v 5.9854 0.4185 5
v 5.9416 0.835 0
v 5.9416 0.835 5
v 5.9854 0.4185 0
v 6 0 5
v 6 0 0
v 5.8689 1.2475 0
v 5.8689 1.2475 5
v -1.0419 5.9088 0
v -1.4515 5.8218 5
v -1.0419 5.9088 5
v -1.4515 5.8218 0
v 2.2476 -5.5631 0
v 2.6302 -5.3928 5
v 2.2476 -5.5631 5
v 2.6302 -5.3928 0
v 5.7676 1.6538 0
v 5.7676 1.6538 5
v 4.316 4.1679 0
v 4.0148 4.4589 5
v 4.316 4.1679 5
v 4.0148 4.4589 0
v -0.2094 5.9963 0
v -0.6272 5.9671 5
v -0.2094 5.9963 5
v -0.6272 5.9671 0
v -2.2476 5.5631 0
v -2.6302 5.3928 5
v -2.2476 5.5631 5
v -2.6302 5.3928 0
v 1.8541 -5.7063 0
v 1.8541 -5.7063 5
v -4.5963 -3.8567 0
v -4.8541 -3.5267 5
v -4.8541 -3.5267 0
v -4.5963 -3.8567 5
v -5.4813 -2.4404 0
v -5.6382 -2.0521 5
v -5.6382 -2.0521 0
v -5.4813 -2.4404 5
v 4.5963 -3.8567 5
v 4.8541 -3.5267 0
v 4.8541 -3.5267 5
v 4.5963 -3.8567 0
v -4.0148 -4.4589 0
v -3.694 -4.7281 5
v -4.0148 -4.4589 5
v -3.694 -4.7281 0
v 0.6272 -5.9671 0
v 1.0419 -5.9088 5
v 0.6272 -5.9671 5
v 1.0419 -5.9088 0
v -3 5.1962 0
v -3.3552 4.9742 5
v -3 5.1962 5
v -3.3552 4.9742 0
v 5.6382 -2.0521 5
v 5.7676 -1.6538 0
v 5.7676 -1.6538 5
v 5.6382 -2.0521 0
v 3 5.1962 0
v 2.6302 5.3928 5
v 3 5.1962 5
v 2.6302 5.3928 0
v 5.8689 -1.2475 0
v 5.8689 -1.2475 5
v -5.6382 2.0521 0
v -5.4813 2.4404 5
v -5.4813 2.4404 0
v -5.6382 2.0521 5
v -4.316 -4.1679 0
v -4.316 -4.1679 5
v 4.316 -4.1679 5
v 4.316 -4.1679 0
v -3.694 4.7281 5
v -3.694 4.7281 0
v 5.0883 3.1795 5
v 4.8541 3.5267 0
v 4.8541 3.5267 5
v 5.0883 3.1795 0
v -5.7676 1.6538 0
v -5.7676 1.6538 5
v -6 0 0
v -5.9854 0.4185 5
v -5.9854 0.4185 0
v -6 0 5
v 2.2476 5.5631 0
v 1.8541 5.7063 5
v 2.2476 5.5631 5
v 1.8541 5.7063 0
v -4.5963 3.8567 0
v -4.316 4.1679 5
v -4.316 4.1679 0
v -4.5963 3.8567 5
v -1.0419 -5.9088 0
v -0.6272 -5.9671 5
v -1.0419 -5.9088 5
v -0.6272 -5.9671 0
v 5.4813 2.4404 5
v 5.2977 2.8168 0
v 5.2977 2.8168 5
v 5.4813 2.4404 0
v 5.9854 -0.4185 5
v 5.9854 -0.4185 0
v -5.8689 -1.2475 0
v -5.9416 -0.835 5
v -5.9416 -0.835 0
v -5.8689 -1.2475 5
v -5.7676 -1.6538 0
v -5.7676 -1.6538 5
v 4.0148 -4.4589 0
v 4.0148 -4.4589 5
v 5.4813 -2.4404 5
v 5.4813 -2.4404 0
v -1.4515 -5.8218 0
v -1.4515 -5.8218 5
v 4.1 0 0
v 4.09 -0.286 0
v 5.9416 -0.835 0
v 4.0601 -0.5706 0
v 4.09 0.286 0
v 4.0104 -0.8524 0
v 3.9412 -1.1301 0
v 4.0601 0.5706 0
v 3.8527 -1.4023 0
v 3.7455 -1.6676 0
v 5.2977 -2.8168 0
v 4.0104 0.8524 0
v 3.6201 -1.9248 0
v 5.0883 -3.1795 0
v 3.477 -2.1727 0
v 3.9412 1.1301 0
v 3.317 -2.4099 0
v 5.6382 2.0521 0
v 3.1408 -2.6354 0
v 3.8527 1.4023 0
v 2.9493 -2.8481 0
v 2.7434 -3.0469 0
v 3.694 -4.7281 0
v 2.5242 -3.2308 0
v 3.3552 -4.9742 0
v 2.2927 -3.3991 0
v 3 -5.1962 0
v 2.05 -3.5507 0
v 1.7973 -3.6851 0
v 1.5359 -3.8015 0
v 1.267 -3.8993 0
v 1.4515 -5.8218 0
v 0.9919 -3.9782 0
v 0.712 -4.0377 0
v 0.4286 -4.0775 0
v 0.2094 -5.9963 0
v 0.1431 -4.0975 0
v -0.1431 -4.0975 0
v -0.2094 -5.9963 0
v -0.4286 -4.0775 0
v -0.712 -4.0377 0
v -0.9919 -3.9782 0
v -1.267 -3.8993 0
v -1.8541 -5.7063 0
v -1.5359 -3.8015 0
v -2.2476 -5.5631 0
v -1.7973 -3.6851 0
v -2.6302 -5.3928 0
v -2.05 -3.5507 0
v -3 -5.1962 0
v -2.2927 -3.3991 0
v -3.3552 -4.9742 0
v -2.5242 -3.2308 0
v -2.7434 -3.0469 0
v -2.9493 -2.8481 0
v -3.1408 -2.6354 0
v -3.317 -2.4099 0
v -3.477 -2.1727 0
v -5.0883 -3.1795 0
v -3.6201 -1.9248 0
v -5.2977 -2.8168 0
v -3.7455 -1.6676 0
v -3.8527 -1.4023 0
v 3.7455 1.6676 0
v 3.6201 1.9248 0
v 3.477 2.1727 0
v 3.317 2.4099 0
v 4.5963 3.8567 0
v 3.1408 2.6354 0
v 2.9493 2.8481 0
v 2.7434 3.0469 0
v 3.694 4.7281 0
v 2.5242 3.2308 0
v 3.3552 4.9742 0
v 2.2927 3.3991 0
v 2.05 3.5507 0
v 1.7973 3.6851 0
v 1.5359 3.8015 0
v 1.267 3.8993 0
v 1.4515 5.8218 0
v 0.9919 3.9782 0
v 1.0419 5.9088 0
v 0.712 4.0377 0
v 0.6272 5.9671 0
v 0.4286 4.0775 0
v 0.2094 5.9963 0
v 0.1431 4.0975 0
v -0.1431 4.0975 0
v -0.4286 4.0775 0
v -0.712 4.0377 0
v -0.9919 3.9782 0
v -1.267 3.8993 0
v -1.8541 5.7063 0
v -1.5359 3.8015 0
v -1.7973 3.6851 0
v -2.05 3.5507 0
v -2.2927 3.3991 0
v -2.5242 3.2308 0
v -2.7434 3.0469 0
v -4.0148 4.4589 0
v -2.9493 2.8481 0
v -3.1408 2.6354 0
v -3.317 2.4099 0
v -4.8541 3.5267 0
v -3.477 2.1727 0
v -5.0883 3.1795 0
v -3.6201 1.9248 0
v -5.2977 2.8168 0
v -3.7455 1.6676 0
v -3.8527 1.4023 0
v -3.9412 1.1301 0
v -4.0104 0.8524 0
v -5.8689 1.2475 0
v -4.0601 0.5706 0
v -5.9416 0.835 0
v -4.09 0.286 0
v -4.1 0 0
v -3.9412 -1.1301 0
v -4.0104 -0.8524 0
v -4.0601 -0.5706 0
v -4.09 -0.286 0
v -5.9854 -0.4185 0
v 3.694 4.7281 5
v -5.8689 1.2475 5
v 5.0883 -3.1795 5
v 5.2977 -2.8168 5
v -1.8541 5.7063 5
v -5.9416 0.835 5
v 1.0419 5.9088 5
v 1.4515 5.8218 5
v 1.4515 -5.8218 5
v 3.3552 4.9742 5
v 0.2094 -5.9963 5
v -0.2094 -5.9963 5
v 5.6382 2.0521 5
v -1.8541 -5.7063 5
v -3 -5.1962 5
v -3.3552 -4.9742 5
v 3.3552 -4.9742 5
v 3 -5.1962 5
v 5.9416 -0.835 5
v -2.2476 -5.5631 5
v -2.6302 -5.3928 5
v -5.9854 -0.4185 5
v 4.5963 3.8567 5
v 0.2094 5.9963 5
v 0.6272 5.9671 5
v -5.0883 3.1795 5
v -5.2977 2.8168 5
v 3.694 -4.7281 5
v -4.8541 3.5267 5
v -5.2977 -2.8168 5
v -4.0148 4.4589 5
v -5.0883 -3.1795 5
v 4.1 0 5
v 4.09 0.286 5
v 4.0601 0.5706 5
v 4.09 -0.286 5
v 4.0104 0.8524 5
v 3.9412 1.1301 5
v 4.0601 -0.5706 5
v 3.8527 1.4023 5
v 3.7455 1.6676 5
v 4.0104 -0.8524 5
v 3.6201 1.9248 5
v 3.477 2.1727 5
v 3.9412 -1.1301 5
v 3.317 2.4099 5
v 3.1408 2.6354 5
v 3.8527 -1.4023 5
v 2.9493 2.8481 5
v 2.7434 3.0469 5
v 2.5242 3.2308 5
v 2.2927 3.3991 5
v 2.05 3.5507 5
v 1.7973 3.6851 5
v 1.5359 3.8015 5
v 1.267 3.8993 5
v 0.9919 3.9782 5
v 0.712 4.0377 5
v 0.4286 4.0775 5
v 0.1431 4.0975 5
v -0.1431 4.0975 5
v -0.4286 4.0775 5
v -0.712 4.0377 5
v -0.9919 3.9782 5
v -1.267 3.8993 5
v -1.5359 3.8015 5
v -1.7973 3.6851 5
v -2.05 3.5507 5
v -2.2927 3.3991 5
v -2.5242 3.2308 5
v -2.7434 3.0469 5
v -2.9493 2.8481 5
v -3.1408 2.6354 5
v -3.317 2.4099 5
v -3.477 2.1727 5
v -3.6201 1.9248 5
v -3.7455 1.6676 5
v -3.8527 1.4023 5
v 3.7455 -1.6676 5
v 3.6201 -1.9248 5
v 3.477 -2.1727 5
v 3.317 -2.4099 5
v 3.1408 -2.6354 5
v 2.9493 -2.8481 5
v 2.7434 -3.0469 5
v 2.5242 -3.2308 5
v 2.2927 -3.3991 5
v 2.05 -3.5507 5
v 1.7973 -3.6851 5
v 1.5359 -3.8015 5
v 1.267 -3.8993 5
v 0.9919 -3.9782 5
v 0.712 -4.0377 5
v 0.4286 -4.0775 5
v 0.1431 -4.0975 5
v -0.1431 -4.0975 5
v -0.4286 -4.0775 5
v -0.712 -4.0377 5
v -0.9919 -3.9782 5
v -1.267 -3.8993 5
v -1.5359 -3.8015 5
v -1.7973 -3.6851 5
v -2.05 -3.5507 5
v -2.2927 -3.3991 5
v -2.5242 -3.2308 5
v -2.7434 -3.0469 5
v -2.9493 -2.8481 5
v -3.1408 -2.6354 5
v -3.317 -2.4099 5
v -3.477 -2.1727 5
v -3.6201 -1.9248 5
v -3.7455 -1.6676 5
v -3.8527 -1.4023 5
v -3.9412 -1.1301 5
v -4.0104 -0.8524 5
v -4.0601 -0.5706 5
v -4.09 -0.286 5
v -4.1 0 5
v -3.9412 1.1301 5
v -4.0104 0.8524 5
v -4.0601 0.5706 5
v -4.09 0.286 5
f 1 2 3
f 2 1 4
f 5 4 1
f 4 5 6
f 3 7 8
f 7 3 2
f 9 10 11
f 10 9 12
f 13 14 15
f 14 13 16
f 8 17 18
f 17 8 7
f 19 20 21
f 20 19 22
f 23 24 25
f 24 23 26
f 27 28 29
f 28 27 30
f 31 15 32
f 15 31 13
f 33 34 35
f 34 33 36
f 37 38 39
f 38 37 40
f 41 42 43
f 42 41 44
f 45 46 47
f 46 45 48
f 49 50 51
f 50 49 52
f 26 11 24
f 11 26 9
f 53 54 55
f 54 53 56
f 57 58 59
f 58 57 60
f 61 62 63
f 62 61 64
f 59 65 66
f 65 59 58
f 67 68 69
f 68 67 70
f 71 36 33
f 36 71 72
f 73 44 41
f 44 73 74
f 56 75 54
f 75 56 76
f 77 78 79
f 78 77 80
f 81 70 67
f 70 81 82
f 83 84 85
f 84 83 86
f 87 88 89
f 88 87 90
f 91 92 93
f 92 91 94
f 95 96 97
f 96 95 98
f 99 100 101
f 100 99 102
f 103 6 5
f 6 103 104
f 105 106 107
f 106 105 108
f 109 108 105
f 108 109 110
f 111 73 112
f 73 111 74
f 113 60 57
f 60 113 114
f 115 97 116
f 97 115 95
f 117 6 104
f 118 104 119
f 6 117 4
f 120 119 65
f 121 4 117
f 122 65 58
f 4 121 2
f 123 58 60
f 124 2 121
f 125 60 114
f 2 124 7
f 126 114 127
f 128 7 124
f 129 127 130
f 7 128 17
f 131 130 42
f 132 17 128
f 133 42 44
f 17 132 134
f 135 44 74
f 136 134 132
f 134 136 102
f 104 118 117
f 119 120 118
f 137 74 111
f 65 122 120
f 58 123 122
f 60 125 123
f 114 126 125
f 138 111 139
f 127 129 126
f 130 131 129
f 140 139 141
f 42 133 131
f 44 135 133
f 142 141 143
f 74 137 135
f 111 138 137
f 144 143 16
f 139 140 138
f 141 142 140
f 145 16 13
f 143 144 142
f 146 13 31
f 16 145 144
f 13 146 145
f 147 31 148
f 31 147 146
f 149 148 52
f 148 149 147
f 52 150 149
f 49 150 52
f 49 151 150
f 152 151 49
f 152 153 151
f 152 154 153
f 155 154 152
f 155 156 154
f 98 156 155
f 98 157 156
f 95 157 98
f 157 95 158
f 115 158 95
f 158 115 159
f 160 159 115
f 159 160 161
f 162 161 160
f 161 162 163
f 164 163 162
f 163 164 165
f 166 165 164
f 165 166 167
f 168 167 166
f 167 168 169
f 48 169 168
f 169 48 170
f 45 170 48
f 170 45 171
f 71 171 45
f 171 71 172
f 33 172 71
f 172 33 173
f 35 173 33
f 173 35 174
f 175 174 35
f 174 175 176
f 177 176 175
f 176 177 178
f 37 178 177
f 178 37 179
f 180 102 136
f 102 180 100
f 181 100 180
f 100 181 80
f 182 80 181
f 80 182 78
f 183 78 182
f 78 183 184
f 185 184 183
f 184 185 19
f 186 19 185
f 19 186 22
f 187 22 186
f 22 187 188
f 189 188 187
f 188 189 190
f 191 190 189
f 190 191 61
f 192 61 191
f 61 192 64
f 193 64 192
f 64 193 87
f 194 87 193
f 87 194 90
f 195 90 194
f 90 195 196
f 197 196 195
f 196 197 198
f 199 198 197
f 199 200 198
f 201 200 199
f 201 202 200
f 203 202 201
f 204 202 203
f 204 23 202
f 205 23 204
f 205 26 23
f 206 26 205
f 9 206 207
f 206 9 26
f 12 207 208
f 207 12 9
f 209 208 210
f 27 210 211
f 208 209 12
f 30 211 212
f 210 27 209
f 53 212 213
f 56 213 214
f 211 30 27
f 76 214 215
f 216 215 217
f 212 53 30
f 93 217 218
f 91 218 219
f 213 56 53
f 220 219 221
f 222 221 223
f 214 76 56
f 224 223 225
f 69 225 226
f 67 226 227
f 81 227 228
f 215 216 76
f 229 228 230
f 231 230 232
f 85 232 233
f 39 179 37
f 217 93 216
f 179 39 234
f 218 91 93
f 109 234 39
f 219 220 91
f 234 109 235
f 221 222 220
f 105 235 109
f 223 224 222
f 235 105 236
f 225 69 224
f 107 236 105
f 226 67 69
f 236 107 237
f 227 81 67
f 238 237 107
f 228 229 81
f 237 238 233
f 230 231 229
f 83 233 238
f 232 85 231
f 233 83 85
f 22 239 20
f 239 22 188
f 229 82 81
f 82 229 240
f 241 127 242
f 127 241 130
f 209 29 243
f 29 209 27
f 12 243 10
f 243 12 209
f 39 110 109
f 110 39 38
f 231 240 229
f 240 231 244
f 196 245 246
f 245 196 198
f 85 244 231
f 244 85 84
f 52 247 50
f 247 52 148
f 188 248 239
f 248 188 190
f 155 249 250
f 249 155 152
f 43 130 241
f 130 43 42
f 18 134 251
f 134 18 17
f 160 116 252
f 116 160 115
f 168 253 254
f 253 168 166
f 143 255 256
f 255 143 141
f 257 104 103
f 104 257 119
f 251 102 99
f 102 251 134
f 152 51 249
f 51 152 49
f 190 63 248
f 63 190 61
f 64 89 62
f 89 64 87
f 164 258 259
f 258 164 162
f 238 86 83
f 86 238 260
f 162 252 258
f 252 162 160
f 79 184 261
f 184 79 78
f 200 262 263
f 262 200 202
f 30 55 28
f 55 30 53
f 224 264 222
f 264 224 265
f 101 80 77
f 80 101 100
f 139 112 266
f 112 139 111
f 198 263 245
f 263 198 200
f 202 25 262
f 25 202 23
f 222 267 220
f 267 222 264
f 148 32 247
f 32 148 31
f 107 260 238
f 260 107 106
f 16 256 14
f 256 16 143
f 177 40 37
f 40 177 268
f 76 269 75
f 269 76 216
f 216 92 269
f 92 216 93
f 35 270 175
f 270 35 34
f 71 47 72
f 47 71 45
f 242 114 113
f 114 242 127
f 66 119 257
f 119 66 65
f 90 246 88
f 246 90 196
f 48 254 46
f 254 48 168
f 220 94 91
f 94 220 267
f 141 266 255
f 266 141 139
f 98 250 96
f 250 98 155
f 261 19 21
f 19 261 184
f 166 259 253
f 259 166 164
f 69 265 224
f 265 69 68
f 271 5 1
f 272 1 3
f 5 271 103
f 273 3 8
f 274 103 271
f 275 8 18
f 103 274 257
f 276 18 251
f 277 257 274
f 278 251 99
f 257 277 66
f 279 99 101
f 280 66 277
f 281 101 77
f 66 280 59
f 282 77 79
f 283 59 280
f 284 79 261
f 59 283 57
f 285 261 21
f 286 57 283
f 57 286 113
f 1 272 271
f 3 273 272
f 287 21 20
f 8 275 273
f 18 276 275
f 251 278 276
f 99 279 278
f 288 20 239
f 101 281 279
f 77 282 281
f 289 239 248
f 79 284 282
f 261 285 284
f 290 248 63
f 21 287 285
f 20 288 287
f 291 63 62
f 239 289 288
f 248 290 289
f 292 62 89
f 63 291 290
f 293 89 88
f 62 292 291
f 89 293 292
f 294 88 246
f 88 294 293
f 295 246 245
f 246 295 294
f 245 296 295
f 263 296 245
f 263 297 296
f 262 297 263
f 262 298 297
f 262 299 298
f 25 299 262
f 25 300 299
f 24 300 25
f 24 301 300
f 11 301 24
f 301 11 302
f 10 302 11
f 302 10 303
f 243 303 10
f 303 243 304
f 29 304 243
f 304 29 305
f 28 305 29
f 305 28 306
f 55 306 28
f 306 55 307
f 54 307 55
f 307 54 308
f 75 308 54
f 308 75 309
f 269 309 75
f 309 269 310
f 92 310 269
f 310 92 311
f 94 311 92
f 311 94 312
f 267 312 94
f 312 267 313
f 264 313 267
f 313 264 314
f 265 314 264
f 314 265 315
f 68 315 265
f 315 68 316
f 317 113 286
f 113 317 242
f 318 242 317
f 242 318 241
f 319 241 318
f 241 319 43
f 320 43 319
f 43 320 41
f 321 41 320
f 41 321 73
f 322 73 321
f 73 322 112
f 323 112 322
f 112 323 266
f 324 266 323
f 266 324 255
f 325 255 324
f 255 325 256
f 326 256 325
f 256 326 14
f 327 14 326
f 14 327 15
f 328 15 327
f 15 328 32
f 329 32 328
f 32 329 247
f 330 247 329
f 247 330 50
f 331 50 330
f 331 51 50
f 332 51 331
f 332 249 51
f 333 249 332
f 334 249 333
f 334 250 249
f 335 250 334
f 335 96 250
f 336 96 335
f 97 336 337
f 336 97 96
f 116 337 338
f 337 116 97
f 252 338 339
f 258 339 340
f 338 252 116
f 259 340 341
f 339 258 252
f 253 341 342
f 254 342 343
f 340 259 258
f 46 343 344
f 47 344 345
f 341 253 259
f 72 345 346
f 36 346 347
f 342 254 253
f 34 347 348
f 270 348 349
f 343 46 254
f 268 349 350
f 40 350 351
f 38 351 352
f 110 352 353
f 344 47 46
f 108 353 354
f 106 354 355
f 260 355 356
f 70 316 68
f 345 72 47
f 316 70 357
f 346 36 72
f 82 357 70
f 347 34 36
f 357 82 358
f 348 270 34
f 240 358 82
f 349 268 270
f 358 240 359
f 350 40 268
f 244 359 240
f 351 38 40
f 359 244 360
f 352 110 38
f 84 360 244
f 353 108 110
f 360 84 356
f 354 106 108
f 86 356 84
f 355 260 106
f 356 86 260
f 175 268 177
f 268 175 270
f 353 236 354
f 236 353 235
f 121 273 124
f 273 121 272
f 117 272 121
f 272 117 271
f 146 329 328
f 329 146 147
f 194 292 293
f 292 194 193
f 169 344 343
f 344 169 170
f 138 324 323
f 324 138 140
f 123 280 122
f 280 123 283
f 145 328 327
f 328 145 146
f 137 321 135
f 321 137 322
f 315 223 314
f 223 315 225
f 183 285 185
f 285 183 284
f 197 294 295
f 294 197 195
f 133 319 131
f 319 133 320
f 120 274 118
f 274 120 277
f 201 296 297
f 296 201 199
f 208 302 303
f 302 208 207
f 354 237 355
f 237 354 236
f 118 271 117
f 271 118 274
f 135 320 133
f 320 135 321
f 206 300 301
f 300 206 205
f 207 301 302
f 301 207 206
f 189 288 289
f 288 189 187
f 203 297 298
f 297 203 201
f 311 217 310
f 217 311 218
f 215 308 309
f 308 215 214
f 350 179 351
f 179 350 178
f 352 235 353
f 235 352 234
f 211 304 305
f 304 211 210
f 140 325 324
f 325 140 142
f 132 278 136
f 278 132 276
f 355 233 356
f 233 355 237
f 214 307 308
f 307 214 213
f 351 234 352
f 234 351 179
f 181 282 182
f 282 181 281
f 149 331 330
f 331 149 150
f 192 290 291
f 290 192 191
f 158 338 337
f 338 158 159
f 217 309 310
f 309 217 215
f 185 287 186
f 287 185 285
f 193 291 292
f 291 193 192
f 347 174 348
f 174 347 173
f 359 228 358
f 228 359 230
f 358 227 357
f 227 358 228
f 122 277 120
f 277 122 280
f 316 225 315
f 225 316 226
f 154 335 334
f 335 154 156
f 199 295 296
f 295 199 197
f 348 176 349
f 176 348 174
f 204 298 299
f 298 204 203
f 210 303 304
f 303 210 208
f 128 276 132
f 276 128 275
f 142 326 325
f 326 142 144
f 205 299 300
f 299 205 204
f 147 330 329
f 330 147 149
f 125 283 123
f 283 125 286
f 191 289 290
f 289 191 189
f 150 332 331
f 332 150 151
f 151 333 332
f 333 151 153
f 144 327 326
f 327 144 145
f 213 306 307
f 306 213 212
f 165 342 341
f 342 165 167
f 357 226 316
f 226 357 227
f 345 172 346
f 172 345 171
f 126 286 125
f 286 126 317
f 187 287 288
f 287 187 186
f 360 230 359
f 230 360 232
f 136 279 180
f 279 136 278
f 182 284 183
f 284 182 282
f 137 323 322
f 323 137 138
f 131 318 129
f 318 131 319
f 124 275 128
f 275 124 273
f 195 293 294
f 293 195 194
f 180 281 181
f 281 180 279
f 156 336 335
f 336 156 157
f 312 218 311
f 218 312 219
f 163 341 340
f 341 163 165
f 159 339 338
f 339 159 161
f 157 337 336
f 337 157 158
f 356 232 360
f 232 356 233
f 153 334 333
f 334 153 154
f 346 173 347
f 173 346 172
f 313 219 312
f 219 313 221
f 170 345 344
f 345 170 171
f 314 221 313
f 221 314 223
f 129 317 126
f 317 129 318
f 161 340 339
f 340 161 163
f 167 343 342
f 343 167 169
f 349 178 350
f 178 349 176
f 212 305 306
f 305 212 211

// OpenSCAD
// file: ../parameters.scad
maximum_printable_size = 150;

layer_thickness = 0.3;
global_clearance = 0.5;


//Screw diameter and nut for M10 [mm]
M10_screw_diameter = 10.4;
M10_head_height = 10;
M10_head_diameter = 16+0.5;
M10_nut_height = 10.5;
M10_nut_diameter = 25.5;
M10_nut_pocket = 22.3;

//Screw diameter for M8 [mm]
M8_screw_diameter = 8.6;
M8_head_height = 8;
M8_head_diameter = 13.5;
M8_nut_height = 7.5;
M8_square_nut_thin_height = 4.5;
M8_nut_diameter = 14.4 + 0.5;
M8_nut_pocket = 13 + 0.5;
M8_washer_diameter = 16;
M8_washer_thickness = 1.5;


//Screw diameter and nut for M6 [mm]
M6_screw_diameter=6.5;
M6_head_diameter = 10+0.5;
M6_head_height = 6;
M6_nut_height = 4.9;
M6_nut_diameter = 11.8;
M6_nut_pocket = 10.4;
M6_square_nut_height = 3;
M6_square_nut_diameter = 10;
M6_washer_thickness = 1.6;

//Screw diameter and nut for M5 [mm]
M5_screw_diameter=5.5;
M5_head_height = 5;
M5_head_diameter = 13+0.5;
M5_nut_height = 4.5;
M5_nut_diameter = 9.4;
M5_nut_pocket = 8.4;

//Screw diameter and nut for M4 [mm]
M4_screw_diameter=4.5;
M4_screw_head_height = 4;
M4_nut_height = 3.2;
M4_nut_diameter = 8.4;
M4_nut_pocket = 7.5;

//Screw diameter and nut for M3 [mm]
M3_screw_diameter = 3.2;
M3_nut_height = 2.7;
M3_nut_diameter = 6.6;
M3_nut_pocket = 5.6;
M3_screw_head_height = 3;

//Screw diameter and nut for M2,5 [mm]
M2_5_screw_diameter = 2.7;
M2_5_nut_height = 2.3;
M2_5_nut_diameter = 6;
M2_5_nut_pocket = 5.5;

//ALU profile
ALU_profile_width = 30.5;
ALU_profile_holder_wall_thickness = 3;
ALU_profile_groove_width = 8;





// Platform parameters ////////////////////////////////////////////
// Main profile parameters
starting_platform_length = 1000; // Main platform profile length
starting_platform_angle = 10; // Angle of attack for platform

// Main cube profile lengths
profile_length_x = 600;
profile_length_y = 600;
profile_length_z = 260;


// Compressor dimensions
compressor_length_x = 410;
compressor_length_y = 140;
compressor_length_z = 310;

// Platform front support parameters
front_holder_width = 160;
front_holder_angle = 25;
front_holder_height = 60;
front_holder_offset = 15;
front_holder_height_offset = 110;

// Lock moving servo parameters
// static par.
servo_length = 40;
servo_width = 20;
servo_height = 40;
servo_axle_offset = 12.5;
servo_axle_height = 5;
servo_movement_angle = 60;
servo_movement_angle_offset = -35; // angle offset up
servo_force = 1.65; // [N/m] torque of servo

// dynamic par.
servo_arm_length = servo_width/2+ALU_profile_width/2+ALU_profile_holder_wall_thickness+4;
servo_travel_y = cos((servo_movement_angle-abs(servo_movement_angle_offset))/2)*servo_arm_length;
servo_arm_hole_length = (servo_arm_length/cos(servo_movement_angle/2))-servo_arm_length+M3_screw_diameter;
servo_joint_offset = sin(servo_movement_angle+servo_movement_angle_offset)*(servo_arm_length+servo_arm_hole_length)+servo_axle_offset;
servo_joint_offset_by_angle = -tan(servo_movement_angle_offset)*servo_arm_length;
servo_max_linear_force = servo_force/(servo_arm_length/1000); // max servo linear force [N]
servo_min_linear_force = cos(servo_movement_angle+abs(servo_movement_angle_offset))*servo_max_linear_force; // min servo linear force [N] in the most extreme position
servo_holding_linear_force = cos(servo_movement_angle+servo_movement_angle_offset)*servo_max_linear_force; // min servo linear force [N] in holding position

// Lock static parameters
lock_screws_dia = 3.2;
lock_depth = 20;
lock_axle_diameter = 15;
lock_grab_axle_dia = 13;
lock_arms_joint_offset = 30;
lock_arms_joint_angle = 90-.01;
lock_tooth_width = 2;

lock_tube_angle = 0;

// Lock dynamic parameters
lock_push_force = (servo_holding_linear_force/cos(lock_arms_joint_angle))/cos(lock_arms_joint_angle); // lock arm pushing force on linear servo joint
lock_push_arm_length = 45;
lock_arm_force_ratio = 1; // lock arm change holding force ratio (0.5 = arm will have half holding force)
lock_hold_arm_length = lock_push_arm_length/lock_arm_force_ratio;
lock_holding_force = lock_push_force*lock_arm_force_ratio;
lock_joint_arm_length = lock_push_arm_length;
// main file
include <../parameters.scad>

module 888_3007(h=5) {
    difference()
    {
        cylinder(d=12,h=h,$fn=90);
        cylinder(d=8.2,h=3*h,center=true,$fn=90);
    }
    
}


888_3007();

//translate([20,0,0])
//888_3007(1.5);
